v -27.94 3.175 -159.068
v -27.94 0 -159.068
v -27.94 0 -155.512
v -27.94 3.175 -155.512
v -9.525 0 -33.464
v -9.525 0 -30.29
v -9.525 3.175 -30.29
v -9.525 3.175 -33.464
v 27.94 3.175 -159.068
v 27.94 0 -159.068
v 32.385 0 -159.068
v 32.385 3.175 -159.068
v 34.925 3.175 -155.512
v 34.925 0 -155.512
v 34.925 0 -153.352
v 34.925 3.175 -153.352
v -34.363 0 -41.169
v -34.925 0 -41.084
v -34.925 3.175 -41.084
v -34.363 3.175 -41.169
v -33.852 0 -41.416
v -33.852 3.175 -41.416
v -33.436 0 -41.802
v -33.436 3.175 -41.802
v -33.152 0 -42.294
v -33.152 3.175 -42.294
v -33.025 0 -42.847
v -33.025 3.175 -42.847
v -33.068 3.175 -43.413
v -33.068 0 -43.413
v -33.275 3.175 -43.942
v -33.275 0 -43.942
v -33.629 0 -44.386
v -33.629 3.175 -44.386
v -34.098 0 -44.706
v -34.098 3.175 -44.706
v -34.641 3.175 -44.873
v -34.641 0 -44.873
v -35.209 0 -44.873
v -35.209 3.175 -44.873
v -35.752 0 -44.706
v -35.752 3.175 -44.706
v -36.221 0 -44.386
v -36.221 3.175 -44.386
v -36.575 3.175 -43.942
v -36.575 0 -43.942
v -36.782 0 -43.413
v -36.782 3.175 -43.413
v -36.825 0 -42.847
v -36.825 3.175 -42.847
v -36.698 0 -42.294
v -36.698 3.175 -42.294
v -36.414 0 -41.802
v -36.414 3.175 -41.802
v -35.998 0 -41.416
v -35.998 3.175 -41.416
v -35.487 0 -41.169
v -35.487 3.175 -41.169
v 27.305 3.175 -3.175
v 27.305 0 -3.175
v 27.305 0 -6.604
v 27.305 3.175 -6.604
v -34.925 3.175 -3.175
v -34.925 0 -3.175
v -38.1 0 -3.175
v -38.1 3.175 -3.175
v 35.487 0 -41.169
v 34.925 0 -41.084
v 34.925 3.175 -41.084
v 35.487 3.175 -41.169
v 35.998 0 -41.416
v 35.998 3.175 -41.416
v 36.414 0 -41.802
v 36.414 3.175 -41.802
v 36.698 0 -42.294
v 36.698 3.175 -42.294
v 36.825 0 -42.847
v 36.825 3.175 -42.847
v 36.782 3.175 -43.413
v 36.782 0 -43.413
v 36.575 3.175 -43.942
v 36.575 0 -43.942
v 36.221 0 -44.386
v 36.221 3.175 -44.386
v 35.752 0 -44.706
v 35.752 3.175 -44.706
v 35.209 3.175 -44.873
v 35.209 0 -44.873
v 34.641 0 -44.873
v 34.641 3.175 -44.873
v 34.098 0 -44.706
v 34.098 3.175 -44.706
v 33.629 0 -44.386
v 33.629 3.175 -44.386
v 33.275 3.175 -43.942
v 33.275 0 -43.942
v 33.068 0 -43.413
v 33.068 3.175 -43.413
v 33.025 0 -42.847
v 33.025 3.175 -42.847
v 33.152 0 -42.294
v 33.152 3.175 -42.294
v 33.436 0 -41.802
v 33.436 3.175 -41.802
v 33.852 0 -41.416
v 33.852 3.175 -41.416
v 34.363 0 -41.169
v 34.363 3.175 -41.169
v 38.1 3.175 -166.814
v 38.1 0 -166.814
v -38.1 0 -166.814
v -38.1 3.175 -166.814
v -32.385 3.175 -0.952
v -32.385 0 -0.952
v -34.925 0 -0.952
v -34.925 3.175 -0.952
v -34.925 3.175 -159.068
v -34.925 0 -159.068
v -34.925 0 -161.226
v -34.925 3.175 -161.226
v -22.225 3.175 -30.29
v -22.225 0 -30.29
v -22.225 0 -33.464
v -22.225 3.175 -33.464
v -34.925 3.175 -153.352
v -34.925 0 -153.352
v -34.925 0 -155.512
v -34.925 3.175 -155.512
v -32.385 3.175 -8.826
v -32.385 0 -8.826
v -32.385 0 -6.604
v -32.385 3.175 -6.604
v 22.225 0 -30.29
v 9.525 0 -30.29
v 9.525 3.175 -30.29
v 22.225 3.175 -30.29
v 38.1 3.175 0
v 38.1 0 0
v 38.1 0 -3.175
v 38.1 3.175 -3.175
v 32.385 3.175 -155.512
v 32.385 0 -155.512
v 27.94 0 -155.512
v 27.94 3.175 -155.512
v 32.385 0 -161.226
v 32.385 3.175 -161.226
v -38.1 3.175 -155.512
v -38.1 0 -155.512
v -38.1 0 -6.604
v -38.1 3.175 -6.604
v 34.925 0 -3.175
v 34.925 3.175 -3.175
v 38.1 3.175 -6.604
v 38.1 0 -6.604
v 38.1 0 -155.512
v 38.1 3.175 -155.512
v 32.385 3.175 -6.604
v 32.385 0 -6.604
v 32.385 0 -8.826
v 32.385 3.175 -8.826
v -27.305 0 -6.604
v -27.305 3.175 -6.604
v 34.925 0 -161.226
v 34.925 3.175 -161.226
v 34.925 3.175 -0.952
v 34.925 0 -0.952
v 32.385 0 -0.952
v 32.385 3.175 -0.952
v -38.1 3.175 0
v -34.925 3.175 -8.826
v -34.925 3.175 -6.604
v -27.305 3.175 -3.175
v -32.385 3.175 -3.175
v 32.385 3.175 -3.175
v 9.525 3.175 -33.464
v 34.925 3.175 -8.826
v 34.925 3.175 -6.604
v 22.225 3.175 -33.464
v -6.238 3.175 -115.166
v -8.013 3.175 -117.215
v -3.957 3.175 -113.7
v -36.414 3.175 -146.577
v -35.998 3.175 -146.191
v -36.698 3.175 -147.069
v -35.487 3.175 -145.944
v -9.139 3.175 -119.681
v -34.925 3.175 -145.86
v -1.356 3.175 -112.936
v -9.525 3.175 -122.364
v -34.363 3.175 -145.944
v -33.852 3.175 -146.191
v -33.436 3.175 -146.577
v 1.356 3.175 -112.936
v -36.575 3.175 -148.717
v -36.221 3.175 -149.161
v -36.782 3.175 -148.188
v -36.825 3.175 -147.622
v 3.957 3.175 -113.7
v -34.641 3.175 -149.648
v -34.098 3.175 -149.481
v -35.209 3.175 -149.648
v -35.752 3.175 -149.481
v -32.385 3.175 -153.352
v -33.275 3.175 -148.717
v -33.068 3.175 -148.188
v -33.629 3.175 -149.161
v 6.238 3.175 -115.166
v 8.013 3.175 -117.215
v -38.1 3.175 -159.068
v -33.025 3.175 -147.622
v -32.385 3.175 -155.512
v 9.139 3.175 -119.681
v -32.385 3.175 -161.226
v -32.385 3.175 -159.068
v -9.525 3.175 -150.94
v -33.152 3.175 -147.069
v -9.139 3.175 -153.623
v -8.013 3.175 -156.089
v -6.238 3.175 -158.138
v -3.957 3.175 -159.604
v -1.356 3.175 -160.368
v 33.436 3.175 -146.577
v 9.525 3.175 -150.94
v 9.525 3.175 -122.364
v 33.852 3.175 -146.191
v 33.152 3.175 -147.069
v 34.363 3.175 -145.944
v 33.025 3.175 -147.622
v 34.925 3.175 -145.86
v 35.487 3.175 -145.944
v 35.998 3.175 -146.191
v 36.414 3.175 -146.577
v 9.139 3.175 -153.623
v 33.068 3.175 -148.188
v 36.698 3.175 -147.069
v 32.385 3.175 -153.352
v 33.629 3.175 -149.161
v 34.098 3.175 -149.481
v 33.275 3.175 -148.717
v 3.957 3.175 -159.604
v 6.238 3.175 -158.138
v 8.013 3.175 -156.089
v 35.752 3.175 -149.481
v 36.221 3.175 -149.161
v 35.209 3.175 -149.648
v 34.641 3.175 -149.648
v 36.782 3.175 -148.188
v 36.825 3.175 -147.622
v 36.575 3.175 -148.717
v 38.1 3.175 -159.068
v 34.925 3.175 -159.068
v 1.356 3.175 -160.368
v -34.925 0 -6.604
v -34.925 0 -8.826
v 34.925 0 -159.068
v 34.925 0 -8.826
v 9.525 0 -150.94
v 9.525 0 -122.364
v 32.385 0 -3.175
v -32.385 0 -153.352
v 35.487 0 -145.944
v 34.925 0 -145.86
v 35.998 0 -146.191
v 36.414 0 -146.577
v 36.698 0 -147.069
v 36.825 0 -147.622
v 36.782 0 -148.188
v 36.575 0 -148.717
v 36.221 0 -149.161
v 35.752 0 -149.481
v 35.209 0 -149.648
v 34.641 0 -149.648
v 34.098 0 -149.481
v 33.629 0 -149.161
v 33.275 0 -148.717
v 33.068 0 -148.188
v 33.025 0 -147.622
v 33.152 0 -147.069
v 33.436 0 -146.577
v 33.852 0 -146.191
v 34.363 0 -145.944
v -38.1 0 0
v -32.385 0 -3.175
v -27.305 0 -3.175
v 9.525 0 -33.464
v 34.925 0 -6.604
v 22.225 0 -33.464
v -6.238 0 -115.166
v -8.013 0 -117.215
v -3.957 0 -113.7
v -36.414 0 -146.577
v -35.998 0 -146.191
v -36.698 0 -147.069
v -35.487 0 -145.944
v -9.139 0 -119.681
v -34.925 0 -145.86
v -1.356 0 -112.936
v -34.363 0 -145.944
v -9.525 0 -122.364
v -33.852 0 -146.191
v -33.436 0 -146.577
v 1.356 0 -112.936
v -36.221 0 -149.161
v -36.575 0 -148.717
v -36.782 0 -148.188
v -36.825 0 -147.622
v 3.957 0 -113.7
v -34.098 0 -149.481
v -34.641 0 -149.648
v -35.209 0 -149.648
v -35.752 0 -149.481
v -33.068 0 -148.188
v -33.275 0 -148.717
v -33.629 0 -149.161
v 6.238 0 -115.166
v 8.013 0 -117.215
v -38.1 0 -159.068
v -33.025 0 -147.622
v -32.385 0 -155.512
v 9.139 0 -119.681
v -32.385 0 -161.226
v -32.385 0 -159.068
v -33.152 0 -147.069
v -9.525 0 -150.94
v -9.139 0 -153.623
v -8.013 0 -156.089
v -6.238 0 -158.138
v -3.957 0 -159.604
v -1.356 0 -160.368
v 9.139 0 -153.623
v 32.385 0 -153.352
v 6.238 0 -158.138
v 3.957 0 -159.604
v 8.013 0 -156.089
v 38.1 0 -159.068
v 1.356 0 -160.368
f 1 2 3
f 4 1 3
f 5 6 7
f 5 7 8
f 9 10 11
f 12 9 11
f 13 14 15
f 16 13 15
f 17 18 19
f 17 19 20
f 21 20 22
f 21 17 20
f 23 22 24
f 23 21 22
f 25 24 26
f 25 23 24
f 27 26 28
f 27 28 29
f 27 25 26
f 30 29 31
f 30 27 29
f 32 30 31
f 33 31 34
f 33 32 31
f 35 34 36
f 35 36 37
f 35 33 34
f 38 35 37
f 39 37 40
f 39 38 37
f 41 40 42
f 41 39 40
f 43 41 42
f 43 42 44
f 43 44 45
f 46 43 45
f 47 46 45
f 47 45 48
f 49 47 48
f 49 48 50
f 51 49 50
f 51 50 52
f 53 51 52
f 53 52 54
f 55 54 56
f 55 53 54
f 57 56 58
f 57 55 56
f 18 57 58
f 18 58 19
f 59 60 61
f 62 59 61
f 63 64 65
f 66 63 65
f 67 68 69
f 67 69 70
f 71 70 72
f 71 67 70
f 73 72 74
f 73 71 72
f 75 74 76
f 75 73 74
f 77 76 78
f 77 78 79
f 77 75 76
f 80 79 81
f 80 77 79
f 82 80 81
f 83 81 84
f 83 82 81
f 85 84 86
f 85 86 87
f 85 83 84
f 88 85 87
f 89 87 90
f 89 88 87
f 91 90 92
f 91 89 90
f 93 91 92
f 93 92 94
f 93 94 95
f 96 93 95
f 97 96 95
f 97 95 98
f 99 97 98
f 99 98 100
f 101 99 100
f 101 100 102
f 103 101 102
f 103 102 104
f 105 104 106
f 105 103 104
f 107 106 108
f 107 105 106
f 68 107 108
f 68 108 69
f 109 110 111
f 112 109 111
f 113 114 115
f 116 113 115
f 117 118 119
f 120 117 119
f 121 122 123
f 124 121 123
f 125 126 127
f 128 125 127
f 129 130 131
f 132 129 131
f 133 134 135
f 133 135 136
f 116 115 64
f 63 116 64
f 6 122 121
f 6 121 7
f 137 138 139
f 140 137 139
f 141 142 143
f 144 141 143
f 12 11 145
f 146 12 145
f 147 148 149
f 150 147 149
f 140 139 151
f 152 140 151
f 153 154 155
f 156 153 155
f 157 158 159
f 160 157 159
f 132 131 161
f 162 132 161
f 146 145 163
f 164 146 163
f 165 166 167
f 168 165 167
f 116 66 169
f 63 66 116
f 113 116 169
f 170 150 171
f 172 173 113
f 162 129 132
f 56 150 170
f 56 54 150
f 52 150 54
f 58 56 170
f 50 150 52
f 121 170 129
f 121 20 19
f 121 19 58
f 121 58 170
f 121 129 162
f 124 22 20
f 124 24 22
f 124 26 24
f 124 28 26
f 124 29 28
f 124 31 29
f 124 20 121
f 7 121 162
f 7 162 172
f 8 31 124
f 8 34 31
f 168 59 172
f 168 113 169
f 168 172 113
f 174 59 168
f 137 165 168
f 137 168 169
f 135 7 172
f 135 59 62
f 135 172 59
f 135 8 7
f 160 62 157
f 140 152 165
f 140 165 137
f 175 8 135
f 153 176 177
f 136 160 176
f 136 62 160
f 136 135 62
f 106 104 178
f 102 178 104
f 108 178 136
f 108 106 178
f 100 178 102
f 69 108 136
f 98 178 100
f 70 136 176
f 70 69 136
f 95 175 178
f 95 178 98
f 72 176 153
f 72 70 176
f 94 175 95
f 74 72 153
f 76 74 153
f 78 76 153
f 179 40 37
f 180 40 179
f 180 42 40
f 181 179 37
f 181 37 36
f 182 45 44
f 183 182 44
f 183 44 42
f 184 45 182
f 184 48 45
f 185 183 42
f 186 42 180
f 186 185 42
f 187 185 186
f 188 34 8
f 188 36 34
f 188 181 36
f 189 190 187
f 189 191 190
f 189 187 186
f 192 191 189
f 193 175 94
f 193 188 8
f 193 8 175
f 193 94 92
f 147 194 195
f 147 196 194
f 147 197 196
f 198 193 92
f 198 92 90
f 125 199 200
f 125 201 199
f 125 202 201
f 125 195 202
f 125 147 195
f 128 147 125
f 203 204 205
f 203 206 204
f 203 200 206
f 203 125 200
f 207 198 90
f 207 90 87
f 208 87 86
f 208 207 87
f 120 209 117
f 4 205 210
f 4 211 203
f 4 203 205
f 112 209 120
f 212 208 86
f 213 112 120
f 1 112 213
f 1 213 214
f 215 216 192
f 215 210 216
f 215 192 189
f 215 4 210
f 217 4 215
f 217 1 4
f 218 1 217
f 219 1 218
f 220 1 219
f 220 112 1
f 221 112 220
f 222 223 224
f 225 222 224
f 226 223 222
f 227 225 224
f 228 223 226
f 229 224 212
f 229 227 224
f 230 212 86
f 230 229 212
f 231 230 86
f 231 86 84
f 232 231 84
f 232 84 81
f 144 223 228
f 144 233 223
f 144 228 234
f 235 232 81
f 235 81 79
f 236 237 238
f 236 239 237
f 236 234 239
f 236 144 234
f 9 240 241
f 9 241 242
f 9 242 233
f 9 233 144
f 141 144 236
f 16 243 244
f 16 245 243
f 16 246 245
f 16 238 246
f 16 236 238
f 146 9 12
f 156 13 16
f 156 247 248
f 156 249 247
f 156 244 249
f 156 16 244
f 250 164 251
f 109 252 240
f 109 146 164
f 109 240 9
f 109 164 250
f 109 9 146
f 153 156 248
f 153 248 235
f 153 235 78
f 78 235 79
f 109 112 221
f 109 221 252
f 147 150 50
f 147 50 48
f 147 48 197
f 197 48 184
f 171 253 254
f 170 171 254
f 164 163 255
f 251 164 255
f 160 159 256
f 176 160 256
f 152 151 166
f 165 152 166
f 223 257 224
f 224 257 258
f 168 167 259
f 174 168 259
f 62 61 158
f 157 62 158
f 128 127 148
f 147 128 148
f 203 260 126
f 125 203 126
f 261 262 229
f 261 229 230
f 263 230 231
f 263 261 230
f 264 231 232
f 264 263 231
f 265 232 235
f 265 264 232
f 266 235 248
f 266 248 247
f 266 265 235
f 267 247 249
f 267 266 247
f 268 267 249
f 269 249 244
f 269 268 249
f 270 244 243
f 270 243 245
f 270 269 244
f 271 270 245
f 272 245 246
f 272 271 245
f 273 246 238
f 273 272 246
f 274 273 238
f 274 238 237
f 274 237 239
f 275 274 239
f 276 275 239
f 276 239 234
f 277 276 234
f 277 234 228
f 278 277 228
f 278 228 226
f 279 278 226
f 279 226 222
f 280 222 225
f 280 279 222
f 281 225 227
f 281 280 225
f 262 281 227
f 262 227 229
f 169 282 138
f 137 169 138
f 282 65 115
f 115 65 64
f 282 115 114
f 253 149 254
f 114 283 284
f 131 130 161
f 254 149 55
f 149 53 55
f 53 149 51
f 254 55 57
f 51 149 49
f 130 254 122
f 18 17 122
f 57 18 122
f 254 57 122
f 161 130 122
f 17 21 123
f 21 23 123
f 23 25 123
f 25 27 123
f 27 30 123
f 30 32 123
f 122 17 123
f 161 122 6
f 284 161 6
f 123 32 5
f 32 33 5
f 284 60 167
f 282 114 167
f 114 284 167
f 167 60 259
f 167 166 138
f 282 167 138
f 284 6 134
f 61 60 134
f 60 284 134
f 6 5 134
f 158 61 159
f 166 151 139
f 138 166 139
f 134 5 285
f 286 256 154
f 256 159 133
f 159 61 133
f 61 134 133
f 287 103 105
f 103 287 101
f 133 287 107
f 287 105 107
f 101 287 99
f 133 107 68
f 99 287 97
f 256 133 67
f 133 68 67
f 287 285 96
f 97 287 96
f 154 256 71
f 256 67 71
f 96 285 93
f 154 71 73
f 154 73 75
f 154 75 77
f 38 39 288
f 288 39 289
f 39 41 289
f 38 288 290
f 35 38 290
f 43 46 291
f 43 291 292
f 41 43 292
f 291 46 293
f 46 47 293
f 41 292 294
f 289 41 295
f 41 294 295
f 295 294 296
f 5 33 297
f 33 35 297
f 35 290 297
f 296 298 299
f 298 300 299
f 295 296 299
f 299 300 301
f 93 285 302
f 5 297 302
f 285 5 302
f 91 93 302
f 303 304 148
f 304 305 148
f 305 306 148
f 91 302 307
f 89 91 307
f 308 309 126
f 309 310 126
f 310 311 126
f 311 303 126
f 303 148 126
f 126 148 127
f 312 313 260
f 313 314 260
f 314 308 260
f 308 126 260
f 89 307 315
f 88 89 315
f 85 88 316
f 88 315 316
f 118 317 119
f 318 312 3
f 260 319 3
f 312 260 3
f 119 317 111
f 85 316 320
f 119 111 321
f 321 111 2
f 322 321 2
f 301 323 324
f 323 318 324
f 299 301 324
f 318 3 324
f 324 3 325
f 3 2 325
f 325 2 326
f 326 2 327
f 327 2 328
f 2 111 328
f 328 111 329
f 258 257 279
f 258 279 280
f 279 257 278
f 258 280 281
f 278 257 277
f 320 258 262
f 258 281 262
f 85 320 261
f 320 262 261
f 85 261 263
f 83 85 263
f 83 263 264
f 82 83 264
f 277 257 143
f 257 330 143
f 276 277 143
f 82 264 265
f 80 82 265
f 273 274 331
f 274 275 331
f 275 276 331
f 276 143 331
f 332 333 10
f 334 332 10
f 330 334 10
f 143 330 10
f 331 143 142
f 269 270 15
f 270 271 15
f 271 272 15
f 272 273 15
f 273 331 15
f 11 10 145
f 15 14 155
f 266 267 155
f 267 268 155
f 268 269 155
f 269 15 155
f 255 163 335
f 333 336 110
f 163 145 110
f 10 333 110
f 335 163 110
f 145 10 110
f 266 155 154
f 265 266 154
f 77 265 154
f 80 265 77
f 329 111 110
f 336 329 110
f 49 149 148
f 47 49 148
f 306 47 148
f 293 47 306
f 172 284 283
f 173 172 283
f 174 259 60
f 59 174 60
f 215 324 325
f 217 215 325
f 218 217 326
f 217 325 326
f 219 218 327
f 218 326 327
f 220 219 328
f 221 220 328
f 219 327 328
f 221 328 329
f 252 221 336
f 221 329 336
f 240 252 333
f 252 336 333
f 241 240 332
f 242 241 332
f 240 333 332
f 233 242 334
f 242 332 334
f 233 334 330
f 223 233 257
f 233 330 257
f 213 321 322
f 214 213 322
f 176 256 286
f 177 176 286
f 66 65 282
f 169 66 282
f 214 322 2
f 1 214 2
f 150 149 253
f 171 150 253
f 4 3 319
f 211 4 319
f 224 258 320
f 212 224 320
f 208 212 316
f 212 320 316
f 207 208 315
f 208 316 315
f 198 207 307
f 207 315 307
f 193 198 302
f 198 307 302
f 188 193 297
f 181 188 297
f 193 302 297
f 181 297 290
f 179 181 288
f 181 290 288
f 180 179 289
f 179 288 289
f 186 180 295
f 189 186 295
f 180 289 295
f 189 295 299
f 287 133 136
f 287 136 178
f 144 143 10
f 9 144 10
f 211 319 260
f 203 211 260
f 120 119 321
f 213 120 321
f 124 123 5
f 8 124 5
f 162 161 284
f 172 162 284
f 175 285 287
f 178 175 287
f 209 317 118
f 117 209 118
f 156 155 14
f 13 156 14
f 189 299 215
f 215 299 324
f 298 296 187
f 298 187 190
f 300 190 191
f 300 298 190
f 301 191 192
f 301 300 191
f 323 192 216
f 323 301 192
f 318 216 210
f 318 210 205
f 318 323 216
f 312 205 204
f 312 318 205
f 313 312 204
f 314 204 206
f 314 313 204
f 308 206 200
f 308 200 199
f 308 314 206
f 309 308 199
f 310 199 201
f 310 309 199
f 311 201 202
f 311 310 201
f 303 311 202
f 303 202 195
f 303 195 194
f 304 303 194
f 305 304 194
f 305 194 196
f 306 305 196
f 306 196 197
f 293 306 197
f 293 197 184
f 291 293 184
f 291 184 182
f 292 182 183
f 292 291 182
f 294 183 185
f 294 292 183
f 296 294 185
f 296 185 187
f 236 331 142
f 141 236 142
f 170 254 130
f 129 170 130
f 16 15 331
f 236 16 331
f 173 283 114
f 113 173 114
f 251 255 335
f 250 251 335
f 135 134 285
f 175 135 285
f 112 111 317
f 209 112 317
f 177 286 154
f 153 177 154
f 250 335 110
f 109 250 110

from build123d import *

# Parameters (mm, degrees)
SKETCH1_R           = 1.905
SKETCH1_W           = 12.7
SKETCH1_H           = 3.175
BOSS_EXTRUDE1_DEPTH = 3.175


with BuildPart() as part:
    # Sketch1 → Boss-Extrude1 (new body)
    with BuildSketch(Plane(origin=(0, 0, 0), x_dir=(1, 0, 0), z_dir=(0, 1, 0))):
        Polygon((-38.1, 6.604), (-34.925, 6.604), (-34.925, 8.8265), (-32.385, 8.8265), (-32.385, 6.604), (-27.305, 6.604), (-27.305, 3.175), (-32.385, 3.175), (-32.385, 0.9525), (-34.925, 0.9525), (-34.925, 3.175), (-38.1, 3.175), (-38.1, 0), (0, 0), (38.1, 0), (38.1, 3.175), (34.925, 3.175), (34.925, 0.9525), (32.385, 0.9525), (32.385, 3.175), (27.305, 3.175), (27.305, 6.604), (32.385, 6.604), (32.385, 8.8265), (34.925, 8.8265), (34.925, 6.604), (38.1, 6.604), (38.1, 155.5115), (34.925, 155.5115), (34.925, 153.3525), (32.385, 153.3525), (32.385, 155.5115), (27.94, 155.5115), (27.94, 159.0675), (32.385, 159.0675), (32.385, 161.2265), (34.925, 161.2265), (34.925, 159.0675), (38.1, 159.0675), (38.1, 166.8145), (-38.1, 166.8145), (-38.1, 159.0675), (-34.925, 159.0675), (-34.925, 161.2265), (-32.385, 161.2265), (-32.385, 159.0675), (-27.94, 159.0675), (-27.94, 155.5115), (-32.385, 155.5115), (-32.385, 153.3525), (-34.925, 153.3525), (-34.925, 155.5115), (-38.1, 155.5115), align=None)
        with Locations(Location((-34.925, 42.9895, 0), (0, 0, 270))):
            Circle(SKETCH1_R, mode=Mode.SUBTRACT)
        with Locations(Location((-34.925, 147.7645, 0), (0, 0, 270))):
            Circle(SKETCH1_R, mode=Mode.SUBTRACT)
        with Locations(Location((34.925, 42.9895, 0), (0, 0, 270))):
            Circle(SKETCH1_R, mode=Mode.SUBTRACT)
        with Locations(Location((34.925, 147.7645, 0), (0, 0, 270))):
            Circle(SKETCH1_R, mode=Mode.SUBTRACT)
        with Locations((-15.875, 31.877)):
            Rectangle(SKETCH1_W, SKETCH1_H, mode=Mode.SUBTRACT)
        with Locations((15.875, 31.877)):
            Rectangle(SKETCH1_W, SKETCH1_H, mode=Mode.SUBTRACT)
        with BuildLine():
            Line((9.525, 150.9395), (9.525, 122.3645))
            ThreePointArc((9.525, 122.3645), (0, 112.8395), (-9.525, 122.3645))
            Line((-9.525, 122.3645), (-9.525, 150.9395))
            ThreePointArc((-9.525, 150.9395), (0, 160.4645), (9.525, 150.9395))
        make_face(mode=Mode.SUBTRACT)
    extrude(amount=BOSS_EXTRUDE1_DEPTH)


solid = part.part
